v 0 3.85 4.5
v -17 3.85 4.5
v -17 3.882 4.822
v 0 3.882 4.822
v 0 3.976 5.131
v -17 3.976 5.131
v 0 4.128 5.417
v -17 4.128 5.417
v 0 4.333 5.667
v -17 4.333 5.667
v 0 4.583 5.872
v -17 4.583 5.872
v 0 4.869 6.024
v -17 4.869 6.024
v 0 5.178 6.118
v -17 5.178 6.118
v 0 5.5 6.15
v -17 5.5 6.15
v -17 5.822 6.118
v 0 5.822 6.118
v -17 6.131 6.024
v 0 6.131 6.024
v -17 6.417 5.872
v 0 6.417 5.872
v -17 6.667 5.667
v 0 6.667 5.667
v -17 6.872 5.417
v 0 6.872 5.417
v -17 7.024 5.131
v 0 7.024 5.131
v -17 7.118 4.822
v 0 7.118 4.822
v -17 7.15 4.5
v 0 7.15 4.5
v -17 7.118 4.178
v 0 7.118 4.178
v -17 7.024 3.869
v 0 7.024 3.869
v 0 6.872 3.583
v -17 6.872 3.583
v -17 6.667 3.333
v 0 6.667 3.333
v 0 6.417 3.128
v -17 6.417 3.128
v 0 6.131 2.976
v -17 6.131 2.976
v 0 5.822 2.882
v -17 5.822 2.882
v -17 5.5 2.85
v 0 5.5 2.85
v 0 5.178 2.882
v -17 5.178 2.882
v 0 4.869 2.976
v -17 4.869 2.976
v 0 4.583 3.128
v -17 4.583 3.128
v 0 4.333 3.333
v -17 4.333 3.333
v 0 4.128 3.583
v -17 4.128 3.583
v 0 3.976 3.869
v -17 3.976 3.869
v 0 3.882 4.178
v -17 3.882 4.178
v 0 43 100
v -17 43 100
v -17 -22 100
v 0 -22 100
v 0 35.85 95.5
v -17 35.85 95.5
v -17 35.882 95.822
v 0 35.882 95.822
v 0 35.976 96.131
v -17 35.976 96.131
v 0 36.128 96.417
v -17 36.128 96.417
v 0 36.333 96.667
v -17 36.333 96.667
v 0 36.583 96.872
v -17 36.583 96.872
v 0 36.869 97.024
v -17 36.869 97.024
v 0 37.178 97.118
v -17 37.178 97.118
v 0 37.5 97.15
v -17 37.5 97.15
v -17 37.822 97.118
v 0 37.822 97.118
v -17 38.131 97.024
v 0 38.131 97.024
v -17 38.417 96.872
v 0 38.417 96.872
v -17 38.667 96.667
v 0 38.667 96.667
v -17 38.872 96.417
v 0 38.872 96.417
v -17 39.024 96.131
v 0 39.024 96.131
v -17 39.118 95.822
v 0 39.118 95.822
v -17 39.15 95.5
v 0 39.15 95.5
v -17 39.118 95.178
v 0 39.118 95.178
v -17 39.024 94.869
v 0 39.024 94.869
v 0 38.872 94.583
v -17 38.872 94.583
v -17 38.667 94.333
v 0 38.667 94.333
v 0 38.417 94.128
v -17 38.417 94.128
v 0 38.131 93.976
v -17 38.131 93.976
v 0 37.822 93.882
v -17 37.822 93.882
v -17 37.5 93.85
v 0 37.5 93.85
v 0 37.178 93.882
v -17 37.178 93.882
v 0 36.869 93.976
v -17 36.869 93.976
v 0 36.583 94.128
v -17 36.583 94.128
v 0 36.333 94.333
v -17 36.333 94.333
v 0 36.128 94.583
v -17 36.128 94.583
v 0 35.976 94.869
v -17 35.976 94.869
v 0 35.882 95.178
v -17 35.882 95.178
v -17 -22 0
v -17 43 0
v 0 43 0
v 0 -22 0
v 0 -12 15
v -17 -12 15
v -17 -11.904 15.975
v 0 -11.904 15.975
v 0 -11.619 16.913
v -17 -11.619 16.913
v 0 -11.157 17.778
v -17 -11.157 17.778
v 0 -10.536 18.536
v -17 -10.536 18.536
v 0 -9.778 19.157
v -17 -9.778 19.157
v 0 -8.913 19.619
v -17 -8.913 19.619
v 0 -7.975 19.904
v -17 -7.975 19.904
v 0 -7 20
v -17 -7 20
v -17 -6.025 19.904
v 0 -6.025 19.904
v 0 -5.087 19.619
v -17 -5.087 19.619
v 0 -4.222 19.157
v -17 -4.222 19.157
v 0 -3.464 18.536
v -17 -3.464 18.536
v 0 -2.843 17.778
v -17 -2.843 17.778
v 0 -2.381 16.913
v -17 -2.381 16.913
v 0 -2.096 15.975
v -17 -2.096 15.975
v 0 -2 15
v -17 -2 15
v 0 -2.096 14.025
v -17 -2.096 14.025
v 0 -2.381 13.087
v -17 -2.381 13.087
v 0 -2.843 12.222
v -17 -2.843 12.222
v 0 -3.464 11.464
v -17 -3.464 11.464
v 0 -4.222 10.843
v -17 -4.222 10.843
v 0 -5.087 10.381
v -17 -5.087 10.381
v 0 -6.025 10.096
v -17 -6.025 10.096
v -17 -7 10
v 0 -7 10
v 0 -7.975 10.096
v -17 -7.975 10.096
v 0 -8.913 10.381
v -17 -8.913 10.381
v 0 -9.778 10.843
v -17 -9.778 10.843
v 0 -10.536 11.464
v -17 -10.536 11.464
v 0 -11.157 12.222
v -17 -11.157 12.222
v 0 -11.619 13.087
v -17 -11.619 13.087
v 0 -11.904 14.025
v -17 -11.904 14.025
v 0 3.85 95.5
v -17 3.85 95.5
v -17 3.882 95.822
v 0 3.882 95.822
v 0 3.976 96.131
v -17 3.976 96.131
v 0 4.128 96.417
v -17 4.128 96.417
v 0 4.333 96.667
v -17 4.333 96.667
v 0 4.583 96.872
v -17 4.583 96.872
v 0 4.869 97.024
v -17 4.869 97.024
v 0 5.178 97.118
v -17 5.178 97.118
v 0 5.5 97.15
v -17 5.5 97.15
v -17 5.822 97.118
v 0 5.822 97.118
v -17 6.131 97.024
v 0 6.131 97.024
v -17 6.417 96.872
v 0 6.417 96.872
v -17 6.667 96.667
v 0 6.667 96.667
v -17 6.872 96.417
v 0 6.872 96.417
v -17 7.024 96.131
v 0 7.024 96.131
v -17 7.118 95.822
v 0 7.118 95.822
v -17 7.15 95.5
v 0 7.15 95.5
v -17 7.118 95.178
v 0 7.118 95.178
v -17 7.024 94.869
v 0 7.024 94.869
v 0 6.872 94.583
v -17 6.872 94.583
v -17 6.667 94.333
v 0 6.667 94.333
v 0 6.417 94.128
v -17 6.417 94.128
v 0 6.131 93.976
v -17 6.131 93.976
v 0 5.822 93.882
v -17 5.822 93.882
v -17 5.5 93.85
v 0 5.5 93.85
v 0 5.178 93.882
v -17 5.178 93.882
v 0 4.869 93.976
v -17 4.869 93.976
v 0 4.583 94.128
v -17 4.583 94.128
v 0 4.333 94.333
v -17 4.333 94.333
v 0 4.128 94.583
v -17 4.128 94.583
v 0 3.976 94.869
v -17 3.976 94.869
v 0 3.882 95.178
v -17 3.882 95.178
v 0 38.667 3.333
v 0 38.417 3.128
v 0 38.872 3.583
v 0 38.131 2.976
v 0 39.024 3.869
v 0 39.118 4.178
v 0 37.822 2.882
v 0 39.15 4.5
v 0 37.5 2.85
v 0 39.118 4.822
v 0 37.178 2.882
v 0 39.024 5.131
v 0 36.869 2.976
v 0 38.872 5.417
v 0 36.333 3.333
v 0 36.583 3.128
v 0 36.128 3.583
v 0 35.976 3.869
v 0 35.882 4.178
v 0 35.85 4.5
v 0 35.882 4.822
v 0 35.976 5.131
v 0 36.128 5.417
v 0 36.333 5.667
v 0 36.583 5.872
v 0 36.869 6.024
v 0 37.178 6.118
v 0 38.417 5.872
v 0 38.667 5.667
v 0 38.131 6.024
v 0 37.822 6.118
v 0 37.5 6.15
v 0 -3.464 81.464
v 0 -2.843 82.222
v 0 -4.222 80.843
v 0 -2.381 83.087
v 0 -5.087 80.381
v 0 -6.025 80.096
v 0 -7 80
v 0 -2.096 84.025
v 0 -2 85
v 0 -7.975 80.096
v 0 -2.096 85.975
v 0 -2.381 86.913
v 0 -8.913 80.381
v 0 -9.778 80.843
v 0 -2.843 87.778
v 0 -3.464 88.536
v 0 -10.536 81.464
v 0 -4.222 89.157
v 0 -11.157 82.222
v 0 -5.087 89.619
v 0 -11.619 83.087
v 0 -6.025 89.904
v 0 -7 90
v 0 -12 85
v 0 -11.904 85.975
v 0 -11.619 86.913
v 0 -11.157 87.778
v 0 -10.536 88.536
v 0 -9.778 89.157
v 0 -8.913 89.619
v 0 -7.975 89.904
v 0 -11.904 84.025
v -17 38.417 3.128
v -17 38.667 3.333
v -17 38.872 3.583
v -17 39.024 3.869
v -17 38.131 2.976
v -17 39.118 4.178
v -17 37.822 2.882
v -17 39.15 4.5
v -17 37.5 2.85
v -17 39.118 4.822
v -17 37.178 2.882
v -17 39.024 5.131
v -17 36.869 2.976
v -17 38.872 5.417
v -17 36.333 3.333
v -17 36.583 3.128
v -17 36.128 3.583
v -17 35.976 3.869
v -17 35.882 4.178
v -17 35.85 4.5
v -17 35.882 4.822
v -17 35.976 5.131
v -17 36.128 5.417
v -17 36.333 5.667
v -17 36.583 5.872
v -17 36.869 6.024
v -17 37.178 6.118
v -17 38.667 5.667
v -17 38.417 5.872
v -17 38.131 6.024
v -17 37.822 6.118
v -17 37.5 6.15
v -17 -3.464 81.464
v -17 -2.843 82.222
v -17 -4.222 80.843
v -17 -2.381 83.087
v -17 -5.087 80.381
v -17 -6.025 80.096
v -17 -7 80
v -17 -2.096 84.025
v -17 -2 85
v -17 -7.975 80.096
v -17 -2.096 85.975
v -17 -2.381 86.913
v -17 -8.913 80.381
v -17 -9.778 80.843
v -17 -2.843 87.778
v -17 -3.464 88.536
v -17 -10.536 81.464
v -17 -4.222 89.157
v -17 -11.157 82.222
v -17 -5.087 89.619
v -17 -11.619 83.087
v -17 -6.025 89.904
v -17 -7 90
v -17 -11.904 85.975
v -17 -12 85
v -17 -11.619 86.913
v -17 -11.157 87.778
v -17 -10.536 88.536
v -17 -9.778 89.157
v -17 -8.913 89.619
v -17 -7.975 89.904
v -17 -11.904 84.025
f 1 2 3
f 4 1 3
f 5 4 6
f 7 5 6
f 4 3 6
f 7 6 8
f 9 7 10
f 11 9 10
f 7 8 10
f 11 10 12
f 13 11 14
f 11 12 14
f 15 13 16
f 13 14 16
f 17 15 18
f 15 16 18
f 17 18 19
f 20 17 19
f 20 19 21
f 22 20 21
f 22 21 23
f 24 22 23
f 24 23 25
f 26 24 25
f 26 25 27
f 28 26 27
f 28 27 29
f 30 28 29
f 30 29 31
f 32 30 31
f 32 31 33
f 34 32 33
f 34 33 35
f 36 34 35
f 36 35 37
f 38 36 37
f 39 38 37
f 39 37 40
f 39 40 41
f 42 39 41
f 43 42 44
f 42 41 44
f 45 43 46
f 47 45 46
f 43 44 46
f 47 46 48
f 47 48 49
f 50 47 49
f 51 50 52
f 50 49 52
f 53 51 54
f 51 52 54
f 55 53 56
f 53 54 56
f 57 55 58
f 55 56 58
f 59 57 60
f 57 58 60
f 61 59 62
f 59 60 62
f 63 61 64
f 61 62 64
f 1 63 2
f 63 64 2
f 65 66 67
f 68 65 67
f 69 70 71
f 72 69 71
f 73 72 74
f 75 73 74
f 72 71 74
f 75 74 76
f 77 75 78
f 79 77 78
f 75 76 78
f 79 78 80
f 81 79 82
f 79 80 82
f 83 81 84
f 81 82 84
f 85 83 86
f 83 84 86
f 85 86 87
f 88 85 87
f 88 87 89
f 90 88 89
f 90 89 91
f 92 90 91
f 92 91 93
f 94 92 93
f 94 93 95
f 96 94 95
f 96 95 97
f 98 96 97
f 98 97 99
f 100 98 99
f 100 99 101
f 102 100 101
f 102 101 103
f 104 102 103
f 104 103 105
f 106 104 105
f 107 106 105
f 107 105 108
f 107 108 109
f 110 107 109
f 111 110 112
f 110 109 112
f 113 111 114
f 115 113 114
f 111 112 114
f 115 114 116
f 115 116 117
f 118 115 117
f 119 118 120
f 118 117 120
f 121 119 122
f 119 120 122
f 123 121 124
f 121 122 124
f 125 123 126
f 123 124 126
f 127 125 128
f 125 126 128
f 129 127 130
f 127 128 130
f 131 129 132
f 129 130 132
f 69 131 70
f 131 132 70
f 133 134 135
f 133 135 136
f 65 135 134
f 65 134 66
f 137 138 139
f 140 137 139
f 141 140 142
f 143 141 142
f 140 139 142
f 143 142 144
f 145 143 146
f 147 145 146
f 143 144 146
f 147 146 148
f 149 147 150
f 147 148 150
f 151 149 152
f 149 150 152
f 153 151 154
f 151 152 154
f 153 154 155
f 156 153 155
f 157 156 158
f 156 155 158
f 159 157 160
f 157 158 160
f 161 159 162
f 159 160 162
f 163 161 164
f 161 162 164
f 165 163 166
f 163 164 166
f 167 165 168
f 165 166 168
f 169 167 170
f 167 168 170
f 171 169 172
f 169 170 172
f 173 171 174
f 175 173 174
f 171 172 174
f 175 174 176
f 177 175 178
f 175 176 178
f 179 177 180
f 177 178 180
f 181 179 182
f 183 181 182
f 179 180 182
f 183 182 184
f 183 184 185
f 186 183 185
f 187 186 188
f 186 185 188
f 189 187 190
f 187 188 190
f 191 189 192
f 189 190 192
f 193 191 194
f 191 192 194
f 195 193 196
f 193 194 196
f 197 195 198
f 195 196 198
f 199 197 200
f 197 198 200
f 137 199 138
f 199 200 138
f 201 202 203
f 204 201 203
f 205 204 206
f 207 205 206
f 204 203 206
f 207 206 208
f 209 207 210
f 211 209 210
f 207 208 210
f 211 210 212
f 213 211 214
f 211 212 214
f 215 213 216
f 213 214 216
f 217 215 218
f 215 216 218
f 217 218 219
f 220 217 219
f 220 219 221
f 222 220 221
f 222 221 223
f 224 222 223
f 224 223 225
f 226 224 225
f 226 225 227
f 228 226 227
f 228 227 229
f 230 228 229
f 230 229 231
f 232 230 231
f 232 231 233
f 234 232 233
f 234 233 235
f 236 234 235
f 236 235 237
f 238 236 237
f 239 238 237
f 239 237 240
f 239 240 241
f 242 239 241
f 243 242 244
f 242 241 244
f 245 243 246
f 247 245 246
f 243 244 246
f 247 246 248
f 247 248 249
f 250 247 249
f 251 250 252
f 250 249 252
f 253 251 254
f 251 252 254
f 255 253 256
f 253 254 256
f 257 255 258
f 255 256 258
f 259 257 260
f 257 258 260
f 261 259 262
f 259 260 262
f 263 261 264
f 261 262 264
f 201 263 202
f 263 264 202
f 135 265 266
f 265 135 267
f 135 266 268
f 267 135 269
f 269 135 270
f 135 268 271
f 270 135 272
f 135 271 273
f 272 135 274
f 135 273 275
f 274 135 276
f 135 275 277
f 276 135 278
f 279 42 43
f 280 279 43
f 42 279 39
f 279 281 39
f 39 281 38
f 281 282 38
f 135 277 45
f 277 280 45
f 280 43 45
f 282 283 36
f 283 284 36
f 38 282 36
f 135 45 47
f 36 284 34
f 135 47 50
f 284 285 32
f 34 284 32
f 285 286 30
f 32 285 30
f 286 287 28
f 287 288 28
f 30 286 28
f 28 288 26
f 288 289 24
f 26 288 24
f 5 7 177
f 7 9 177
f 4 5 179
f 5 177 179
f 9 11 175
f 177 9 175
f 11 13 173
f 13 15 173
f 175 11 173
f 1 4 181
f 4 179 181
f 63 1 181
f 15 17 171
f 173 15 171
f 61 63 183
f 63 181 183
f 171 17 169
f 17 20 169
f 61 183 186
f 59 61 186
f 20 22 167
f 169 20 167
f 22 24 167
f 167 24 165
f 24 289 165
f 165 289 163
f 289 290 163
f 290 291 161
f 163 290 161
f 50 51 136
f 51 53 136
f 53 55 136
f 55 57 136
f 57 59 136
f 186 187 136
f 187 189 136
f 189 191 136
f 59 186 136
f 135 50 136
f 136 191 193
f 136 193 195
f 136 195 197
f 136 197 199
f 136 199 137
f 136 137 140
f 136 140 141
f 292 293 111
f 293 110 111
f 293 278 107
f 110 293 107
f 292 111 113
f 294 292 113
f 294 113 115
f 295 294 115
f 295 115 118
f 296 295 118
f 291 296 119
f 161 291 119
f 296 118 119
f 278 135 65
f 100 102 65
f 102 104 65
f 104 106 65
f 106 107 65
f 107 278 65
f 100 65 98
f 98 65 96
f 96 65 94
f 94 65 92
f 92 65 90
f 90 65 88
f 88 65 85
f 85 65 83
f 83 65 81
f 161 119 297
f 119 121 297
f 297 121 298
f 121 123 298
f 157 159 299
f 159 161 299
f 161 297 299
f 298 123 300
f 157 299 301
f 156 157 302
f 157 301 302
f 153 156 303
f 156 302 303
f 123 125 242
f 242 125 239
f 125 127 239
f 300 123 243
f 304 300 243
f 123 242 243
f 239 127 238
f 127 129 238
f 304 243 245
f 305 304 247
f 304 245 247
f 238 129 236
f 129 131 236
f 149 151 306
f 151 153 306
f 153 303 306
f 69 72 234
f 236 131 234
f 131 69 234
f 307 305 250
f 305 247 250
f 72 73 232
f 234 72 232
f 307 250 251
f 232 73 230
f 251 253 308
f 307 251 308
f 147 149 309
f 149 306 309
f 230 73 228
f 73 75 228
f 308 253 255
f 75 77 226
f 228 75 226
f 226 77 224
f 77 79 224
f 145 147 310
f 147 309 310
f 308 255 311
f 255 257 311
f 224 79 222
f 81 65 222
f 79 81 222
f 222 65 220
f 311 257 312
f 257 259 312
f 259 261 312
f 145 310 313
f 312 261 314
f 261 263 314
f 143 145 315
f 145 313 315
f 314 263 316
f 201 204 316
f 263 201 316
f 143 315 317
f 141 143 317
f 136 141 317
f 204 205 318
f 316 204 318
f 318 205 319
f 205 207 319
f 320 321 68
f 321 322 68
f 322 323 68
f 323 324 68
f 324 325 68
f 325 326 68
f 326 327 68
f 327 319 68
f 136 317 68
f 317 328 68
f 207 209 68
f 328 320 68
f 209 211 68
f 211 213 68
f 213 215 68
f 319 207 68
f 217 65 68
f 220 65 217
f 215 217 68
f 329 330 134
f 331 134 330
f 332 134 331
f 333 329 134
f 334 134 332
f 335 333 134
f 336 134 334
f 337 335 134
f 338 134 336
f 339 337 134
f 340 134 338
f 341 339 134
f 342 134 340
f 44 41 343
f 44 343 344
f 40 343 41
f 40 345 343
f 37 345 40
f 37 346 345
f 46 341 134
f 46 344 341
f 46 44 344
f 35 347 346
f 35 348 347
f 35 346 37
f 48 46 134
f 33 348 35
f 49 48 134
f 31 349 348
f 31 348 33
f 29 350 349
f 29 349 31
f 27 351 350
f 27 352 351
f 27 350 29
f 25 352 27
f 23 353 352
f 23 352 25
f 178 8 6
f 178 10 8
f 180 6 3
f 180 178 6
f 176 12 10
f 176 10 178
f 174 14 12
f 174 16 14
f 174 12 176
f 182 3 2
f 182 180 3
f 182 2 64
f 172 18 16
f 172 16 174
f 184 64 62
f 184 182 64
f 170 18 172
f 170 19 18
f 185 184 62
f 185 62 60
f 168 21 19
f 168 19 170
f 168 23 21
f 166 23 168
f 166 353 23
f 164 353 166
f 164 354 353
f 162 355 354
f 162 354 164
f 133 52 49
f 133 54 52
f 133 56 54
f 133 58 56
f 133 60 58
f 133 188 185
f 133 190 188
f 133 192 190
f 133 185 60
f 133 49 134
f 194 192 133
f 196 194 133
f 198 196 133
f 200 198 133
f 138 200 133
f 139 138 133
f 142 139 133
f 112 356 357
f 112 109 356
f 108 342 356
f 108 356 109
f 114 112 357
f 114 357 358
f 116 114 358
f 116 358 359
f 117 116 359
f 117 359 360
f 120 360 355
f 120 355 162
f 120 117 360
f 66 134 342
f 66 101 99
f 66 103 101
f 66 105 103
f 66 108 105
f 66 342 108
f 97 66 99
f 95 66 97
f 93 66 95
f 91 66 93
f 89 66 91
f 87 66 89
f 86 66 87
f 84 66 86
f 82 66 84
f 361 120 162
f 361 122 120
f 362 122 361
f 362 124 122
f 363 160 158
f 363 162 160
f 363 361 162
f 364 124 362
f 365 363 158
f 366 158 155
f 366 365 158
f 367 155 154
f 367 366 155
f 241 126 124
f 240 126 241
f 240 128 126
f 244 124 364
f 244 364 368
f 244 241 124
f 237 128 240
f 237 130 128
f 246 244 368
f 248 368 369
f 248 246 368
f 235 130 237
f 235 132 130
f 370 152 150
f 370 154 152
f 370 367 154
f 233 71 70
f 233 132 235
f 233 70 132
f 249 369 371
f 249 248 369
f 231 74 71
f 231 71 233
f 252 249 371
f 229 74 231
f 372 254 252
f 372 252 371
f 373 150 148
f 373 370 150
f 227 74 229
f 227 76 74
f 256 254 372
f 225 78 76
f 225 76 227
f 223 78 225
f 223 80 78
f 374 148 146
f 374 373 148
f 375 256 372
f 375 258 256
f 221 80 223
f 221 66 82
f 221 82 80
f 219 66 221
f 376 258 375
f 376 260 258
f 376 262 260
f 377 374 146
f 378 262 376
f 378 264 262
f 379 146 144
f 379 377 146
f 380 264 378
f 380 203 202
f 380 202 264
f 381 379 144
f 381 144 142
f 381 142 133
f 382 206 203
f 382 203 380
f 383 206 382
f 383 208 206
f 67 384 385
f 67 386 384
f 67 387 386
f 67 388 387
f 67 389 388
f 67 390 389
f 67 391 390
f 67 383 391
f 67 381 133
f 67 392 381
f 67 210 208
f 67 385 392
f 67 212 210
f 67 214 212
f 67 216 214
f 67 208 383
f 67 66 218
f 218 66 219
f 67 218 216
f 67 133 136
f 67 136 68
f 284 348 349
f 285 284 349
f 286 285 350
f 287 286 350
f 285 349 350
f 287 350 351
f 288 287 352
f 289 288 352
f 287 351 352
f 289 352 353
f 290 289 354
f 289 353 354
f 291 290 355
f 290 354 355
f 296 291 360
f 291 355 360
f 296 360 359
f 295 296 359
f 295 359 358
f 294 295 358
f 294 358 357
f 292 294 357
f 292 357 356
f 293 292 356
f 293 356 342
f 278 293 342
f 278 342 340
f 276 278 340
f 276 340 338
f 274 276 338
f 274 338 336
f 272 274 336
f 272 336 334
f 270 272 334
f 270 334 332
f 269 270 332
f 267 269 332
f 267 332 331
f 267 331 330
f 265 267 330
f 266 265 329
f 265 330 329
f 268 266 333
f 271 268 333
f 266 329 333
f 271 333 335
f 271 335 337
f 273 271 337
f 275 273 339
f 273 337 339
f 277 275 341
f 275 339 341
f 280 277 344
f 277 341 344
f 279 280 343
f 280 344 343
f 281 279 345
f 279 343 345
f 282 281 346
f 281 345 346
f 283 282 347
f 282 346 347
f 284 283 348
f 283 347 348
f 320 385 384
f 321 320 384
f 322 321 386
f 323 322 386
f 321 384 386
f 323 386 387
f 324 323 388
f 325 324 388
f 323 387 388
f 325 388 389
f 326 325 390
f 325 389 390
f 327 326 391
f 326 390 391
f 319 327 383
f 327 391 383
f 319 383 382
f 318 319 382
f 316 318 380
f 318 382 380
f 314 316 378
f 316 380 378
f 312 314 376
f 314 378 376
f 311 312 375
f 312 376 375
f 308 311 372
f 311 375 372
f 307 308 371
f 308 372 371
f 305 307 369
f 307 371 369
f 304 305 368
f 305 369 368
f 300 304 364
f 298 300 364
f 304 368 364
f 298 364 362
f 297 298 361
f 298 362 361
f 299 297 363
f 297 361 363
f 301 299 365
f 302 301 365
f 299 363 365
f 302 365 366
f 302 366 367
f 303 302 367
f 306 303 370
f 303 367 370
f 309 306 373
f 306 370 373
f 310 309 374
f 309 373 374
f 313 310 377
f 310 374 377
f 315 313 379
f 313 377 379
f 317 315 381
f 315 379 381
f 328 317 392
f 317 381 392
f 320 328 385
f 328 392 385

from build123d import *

# Parameters (mm, degrees)
F1_DEPTH = 17
F2_D     = 3.3
F3_W     = 22
F3_H     = 100
F3_R     = 5
F4_DEPTH = 17


with BuildPart() as f1:
    # F0 (on Right) → F1 (new body)
    with BuildSketch(Plane.YZ):
        Polygon((43, 100), (0, 100), (0, 0), (43, 0), (43, 33), (43, 67), align=None)
    extrude(amount=-F1_DEPTH)

    # F2 (through all)
    with Locations(Plane.YZ):
        with Locations((37.5, 4.5), (5.5, 4.5), (5.5, 95.5), (37.5, 95.5)):
            Hole(F2_D / 2)

    # F3 (on face) → F4 (join, through all)
    with BuildSketch(Plane(origin=(-17, 0, 0), x_dir=(0, -1, 0), z_dir=(-1, 0, 0))):
        with Locations((11, 50)):
            Rectangle(F3_W, F3_H)
        with Locations((7, 15)):
            Circle(F3_R, mode=Mode.SUBTRACT)
        with Locations((7, 85)):
            Circle(F3_R, mode=Mode.SUBTRACT)
    extrude(amount=-F4_DEPTH)


solid = f1.part
